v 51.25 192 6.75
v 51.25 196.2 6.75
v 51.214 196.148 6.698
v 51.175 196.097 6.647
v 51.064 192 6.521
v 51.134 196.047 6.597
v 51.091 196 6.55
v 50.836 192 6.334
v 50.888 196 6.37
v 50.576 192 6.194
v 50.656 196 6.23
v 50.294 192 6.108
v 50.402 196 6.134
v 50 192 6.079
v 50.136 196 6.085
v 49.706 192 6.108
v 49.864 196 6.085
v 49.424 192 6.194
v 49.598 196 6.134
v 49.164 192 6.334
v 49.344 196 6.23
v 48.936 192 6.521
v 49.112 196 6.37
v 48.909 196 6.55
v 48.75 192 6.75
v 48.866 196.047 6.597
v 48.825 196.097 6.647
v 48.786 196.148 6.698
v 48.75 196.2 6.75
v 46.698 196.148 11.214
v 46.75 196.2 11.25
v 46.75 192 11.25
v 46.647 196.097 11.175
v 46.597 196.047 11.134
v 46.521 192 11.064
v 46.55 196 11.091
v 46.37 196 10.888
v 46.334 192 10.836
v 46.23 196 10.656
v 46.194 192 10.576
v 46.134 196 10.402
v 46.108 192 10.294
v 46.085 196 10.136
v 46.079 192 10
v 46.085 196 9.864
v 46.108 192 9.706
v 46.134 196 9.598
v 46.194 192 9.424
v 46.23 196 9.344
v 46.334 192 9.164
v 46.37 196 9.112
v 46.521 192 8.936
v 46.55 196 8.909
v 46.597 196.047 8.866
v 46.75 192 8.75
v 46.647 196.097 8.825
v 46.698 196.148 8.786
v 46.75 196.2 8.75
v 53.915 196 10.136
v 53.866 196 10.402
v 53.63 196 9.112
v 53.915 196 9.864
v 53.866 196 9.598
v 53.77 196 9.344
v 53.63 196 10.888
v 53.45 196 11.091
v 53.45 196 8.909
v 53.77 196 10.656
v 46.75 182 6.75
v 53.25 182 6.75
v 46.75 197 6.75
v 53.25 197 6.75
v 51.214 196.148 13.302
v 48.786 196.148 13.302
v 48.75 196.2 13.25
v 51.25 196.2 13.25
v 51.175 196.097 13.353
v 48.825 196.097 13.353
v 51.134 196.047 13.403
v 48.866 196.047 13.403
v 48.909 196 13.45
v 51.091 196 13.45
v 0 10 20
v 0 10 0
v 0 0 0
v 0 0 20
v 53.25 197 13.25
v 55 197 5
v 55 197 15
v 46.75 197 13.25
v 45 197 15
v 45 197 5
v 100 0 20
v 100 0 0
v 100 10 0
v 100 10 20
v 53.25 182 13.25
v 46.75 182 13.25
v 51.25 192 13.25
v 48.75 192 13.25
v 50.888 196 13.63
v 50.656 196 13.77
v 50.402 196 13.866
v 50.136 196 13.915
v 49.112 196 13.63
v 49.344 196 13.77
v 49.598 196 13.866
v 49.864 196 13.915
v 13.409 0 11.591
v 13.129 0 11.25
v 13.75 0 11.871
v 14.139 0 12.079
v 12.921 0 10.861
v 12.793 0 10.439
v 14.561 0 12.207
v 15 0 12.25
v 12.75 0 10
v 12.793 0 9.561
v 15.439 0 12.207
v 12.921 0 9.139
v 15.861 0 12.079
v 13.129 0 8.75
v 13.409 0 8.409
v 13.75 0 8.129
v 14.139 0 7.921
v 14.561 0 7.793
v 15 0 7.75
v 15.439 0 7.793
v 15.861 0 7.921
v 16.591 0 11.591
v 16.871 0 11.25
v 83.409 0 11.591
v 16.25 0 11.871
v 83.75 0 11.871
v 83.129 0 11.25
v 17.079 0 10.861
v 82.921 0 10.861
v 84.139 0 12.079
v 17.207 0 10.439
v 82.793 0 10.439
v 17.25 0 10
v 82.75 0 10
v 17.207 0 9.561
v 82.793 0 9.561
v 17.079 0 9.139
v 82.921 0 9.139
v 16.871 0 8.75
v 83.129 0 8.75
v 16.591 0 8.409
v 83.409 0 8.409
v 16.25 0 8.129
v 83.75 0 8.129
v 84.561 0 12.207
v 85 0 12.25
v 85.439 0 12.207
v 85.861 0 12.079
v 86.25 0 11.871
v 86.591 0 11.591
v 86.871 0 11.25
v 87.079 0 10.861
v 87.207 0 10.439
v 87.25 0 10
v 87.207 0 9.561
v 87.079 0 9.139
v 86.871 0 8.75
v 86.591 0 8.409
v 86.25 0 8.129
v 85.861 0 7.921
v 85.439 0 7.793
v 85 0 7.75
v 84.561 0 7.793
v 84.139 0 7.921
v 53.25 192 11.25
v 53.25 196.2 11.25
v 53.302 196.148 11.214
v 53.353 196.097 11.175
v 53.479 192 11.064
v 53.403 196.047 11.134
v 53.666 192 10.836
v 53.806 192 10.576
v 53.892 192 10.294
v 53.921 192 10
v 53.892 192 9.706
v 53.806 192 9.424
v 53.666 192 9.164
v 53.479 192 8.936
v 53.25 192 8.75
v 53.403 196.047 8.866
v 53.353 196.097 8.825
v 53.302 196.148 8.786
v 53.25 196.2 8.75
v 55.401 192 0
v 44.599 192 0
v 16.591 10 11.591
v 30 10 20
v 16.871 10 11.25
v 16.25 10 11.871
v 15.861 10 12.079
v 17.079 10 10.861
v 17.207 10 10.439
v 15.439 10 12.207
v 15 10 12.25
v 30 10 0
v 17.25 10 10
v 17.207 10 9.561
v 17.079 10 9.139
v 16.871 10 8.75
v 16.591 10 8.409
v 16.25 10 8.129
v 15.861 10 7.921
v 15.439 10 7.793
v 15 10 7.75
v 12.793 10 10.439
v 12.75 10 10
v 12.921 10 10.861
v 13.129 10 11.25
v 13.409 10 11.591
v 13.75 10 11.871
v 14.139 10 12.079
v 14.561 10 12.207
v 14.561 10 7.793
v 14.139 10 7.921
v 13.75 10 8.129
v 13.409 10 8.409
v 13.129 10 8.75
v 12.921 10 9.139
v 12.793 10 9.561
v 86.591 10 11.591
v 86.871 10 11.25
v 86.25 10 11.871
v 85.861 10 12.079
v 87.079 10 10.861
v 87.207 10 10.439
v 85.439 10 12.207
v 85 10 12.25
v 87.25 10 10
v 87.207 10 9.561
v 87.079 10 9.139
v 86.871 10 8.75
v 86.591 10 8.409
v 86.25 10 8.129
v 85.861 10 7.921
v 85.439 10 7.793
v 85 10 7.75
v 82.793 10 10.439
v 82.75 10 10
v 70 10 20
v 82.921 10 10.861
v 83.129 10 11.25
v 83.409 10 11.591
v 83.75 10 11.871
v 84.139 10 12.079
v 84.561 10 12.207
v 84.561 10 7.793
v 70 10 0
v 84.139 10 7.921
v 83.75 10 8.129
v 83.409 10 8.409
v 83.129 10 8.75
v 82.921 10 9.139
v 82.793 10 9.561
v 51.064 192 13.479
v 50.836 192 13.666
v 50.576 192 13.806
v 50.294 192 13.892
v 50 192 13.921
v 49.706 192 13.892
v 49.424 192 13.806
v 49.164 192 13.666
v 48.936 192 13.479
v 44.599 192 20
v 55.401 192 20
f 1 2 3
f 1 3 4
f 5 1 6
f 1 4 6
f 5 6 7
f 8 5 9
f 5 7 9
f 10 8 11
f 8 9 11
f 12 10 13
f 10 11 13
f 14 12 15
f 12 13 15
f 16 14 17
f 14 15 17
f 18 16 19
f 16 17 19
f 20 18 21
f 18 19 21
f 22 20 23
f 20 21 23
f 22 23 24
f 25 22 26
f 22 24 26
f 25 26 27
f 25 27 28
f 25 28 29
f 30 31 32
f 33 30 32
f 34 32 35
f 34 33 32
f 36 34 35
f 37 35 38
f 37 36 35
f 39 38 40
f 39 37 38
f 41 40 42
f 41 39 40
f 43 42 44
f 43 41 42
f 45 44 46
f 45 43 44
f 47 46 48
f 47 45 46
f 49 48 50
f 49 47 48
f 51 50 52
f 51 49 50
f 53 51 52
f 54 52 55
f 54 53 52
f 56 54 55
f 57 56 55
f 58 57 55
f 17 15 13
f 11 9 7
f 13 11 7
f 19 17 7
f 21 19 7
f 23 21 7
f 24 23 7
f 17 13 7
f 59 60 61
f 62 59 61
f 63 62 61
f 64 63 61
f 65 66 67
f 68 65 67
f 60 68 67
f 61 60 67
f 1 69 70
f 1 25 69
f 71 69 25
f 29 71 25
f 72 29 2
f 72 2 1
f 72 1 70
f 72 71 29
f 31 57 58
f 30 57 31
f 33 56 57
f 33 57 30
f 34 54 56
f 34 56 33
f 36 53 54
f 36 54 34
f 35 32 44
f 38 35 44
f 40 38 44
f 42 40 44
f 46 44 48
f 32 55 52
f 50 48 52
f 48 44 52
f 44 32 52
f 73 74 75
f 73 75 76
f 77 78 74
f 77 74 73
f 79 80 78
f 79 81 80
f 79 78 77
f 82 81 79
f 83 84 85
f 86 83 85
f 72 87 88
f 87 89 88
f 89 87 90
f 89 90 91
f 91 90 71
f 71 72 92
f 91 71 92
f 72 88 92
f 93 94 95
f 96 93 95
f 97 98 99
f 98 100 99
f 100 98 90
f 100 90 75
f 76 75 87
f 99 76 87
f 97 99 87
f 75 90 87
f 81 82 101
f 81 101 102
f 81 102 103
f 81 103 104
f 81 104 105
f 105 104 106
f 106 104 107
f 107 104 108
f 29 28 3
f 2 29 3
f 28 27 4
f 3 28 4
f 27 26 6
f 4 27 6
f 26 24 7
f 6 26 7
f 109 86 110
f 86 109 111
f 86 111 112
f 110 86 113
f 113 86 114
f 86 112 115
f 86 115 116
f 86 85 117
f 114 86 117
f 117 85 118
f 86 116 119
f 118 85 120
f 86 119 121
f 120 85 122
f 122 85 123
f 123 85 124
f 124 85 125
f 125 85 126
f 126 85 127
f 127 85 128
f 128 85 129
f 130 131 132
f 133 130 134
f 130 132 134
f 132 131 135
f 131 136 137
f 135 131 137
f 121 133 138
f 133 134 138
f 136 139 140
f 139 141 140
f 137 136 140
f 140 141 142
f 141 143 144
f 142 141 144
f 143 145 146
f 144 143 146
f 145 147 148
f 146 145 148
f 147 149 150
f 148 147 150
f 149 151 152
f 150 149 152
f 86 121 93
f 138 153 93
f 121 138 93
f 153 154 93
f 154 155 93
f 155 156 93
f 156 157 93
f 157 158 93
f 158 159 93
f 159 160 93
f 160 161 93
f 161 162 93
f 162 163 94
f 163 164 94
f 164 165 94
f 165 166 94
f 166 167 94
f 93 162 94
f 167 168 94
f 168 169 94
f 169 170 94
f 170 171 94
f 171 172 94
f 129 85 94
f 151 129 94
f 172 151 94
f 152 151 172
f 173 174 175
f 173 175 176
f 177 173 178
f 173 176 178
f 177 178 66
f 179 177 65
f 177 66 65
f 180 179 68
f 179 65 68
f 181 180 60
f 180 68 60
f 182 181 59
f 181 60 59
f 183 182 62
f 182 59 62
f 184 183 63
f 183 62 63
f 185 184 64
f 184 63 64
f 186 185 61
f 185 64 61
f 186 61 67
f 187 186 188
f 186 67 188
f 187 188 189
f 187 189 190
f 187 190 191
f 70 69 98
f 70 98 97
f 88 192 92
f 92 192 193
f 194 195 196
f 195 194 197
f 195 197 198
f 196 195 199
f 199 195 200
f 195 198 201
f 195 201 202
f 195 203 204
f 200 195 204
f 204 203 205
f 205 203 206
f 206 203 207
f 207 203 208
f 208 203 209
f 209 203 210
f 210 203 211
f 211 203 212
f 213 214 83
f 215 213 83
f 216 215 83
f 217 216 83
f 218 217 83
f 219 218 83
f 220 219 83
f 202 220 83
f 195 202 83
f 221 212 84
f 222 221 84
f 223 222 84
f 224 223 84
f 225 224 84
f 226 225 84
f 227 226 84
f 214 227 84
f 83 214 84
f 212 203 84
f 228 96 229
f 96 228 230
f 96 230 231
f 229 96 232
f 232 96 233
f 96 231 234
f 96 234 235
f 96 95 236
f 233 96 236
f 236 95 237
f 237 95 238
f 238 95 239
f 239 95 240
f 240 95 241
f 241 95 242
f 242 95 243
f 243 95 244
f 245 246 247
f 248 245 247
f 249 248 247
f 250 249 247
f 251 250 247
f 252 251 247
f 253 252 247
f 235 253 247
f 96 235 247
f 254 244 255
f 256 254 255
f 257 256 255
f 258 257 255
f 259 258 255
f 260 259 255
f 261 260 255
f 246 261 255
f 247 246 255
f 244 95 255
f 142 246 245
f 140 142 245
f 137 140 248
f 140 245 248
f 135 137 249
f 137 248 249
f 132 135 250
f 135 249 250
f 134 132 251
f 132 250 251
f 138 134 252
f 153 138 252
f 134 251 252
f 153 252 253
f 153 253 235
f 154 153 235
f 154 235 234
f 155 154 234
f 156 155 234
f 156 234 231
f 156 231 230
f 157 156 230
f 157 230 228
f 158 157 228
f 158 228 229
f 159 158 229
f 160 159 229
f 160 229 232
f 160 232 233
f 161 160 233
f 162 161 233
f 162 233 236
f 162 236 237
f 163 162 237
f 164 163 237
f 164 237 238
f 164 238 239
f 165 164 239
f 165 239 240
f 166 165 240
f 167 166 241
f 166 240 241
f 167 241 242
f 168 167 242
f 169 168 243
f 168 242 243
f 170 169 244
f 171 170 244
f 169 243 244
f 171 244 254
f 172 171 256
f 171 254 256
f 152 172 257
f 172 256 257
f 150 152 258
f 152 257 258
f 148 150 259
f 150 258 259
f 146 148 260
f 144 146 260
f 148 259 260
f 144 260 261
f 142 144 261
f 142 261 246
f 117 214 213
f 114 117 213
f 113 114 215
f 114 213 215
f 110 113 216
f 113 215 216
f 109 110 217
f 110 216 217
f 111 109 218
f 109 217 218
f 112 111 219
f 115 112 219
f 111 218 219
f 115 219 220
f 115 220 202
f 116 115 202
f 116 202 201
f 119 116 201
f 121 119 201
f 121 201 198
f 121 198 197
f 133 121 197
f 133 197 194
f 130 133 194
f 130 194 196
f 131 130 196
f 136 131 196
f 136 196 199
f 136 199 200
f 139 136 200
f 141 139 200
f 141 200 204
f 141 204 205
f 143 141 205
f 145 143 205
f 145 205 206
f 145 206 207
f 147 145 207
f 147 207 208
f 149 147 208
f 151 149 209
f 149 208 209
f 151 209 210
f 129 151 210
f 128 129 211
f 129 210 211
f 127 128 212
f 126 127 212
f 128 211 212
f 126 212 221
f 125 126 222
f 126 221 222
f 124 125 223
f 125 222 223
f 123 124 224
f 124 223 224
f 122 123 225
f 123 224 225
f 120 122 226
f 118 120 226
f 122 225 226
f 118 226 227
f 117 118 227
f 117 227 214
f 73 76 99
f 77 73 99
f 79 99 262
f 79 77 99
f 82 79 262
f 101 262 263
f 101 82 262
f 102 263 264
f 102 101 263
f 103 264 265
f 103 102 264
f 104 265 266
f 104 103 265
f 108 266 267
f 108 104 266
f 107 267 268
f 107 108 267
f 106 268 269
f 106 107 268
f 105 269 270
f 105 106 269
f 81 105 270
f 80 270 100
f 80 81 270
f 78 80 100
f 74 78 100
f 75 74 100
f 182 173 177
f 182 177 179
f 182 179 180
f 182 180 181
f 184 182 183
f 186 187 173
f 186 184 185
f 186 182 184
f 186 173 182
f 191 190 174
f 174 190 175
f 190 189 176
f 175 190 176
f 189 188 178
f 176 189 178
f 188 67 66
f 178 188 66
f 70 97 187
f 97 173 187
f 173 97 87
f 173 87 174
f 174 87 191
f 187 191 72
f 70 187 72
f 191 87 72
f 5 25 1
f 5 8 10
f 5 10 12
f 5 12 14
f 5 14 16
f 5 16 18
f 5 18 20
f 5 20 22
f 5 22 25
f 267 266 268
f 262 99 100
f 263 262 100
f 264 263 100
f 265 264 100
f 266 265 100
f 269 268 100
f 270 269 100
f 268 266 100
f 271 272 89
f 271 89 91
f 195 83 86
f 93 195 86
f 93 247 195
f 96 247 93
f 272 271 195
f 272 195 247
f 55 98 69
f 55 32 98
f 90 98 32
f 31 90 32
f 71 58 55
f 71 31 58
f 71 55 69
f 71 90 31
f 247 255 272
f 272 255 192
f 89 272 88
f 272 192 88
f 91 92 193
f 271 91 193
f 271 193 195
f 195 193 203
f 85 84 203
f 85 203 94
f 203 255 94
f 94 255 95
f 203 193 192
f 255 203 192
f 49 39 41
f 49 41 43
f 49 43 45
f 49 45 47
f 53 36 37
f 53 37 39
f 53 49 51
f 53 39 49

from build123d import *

# Parameters (mm, degrees)
RESSALTO_EXTRUS_O4_DEPTH = 20
ESBO_O8_W                = 6.5
ESBO_O8_H                = 6.5
CORTE_EXTRUS_O1_DEPTH    = 15
CORTE_EXTRUS_O2_START    = -1
CORTE_EXTRUS_O2_DEPTH    = 4
CHANFRO1_SIZE            = 0.2
CHANFRO2_SIZE            = 5
ESBO_O10_R               = 2.25
CORTE_EXTRUS_O3_DEPTH    = 214


with BuildPart() as part:
    # Esboço7 → Ressalto-extrusão4 (new body)
    with BuildSketch(Plane.XY):
        Polygon((0, 0), (100, 0), (100, 10), (70, 10), (55, 197), (45, 197), (30, 10), (0, 10), align=None)
    extrude(amount=RESSALTO_EXTRUS_O4_DEPTH)

    # Esboço8 → Corte-extrusão1 (cut)
    with BuildSketch(Plane(origin=(0, 197, 0), x_dir=(1, 0, 0), z_dir=(0, 1, 0))):
        with Locations((50, -10)):
            Rectangle(ESBO_O8_W, ESBO_O8_H)
    extrude(amount=-CORTE_EXTRUS_O1_DEPTH, mode=Mode.SUBTRACT)

    # Esboço9 → Corte-extrusão2 (cut)
    with BuildSketch(Plane(origin=(0, 197, 0), x_dir=(1, 0, 0), z_dir=(0, 1, 0)).offset(CORTE_EXTRUS_O2_START)):
        with BuildLine():
            Line((48.75, -6.75), (51.25, -6.75))
            ThreePointArc((51.25, -6.75), (50, -6.079156198), (48.75, -6.75))
        make_face()
        with BuildLine():
            Line((53.25, -8.75), (53.25, -11.25))
            ThreePointArc((53.25, -11.25), (53.920843802, -10), (53.25, -8.75))
        make_face()
        with BuildLine():
            Line((46.75, -8.75), (46.75, -11.25))
            ThreePointArc((46.75, -11.25), (46.079156198, -10), (46.75, -8.75))
        make_face()
        with BuildLine():
            Line((48.75, -13.25), (51.25, -13.25))
            ThreePointArc((51.25, -13.25), (50, -13.920843802), (48.75, -13.25))
        make_face()
    extrude(amount=-CORTE_EXTRUS_O2_DEPTH, mode=Mode.SUBTRACT)

    # Chanfro1
    chanfro1_edges = [part.edges().sort_by_distance(p)[0] for p in [
        (50, 196, 6.75),
        (53.25, 196, 10),
        (50, 196, 13.25),
        (46.75, 196, 10),
    ]]
    chamfer(chanfro1_edges, length=CHANFRO1_SIZE)

    # Chanfro2
    chanfro2_edges = [part.edges().sort_by_distance(p)[0] for p in [
        (50, 197, 20),
        (50, 197, 0),
    ]]
    chamfer(chanfro2_edges, length=CHANFRO2_SIZE)

    # Esboço10 → Corte-extrusão3 (cut, through all)
    with BuildSketch(Plane(origin=(0, 10, 0), x_dir=(1, 0, 0), z_dir=(0, 1, 0))):
        with Locations(Location((15, -10, 0), (0, 0, 180))):
            Circle(ESBO_O10_R)
        with Locations(Location((85, -10, 0), (0, 0, 180))):
            Circle(ESBO_O10_R)
    extrude(amount=-CORTE_EXTRUS_O3_DEPTH, mode=Mode.SUBTRACT)


solid = part.part
